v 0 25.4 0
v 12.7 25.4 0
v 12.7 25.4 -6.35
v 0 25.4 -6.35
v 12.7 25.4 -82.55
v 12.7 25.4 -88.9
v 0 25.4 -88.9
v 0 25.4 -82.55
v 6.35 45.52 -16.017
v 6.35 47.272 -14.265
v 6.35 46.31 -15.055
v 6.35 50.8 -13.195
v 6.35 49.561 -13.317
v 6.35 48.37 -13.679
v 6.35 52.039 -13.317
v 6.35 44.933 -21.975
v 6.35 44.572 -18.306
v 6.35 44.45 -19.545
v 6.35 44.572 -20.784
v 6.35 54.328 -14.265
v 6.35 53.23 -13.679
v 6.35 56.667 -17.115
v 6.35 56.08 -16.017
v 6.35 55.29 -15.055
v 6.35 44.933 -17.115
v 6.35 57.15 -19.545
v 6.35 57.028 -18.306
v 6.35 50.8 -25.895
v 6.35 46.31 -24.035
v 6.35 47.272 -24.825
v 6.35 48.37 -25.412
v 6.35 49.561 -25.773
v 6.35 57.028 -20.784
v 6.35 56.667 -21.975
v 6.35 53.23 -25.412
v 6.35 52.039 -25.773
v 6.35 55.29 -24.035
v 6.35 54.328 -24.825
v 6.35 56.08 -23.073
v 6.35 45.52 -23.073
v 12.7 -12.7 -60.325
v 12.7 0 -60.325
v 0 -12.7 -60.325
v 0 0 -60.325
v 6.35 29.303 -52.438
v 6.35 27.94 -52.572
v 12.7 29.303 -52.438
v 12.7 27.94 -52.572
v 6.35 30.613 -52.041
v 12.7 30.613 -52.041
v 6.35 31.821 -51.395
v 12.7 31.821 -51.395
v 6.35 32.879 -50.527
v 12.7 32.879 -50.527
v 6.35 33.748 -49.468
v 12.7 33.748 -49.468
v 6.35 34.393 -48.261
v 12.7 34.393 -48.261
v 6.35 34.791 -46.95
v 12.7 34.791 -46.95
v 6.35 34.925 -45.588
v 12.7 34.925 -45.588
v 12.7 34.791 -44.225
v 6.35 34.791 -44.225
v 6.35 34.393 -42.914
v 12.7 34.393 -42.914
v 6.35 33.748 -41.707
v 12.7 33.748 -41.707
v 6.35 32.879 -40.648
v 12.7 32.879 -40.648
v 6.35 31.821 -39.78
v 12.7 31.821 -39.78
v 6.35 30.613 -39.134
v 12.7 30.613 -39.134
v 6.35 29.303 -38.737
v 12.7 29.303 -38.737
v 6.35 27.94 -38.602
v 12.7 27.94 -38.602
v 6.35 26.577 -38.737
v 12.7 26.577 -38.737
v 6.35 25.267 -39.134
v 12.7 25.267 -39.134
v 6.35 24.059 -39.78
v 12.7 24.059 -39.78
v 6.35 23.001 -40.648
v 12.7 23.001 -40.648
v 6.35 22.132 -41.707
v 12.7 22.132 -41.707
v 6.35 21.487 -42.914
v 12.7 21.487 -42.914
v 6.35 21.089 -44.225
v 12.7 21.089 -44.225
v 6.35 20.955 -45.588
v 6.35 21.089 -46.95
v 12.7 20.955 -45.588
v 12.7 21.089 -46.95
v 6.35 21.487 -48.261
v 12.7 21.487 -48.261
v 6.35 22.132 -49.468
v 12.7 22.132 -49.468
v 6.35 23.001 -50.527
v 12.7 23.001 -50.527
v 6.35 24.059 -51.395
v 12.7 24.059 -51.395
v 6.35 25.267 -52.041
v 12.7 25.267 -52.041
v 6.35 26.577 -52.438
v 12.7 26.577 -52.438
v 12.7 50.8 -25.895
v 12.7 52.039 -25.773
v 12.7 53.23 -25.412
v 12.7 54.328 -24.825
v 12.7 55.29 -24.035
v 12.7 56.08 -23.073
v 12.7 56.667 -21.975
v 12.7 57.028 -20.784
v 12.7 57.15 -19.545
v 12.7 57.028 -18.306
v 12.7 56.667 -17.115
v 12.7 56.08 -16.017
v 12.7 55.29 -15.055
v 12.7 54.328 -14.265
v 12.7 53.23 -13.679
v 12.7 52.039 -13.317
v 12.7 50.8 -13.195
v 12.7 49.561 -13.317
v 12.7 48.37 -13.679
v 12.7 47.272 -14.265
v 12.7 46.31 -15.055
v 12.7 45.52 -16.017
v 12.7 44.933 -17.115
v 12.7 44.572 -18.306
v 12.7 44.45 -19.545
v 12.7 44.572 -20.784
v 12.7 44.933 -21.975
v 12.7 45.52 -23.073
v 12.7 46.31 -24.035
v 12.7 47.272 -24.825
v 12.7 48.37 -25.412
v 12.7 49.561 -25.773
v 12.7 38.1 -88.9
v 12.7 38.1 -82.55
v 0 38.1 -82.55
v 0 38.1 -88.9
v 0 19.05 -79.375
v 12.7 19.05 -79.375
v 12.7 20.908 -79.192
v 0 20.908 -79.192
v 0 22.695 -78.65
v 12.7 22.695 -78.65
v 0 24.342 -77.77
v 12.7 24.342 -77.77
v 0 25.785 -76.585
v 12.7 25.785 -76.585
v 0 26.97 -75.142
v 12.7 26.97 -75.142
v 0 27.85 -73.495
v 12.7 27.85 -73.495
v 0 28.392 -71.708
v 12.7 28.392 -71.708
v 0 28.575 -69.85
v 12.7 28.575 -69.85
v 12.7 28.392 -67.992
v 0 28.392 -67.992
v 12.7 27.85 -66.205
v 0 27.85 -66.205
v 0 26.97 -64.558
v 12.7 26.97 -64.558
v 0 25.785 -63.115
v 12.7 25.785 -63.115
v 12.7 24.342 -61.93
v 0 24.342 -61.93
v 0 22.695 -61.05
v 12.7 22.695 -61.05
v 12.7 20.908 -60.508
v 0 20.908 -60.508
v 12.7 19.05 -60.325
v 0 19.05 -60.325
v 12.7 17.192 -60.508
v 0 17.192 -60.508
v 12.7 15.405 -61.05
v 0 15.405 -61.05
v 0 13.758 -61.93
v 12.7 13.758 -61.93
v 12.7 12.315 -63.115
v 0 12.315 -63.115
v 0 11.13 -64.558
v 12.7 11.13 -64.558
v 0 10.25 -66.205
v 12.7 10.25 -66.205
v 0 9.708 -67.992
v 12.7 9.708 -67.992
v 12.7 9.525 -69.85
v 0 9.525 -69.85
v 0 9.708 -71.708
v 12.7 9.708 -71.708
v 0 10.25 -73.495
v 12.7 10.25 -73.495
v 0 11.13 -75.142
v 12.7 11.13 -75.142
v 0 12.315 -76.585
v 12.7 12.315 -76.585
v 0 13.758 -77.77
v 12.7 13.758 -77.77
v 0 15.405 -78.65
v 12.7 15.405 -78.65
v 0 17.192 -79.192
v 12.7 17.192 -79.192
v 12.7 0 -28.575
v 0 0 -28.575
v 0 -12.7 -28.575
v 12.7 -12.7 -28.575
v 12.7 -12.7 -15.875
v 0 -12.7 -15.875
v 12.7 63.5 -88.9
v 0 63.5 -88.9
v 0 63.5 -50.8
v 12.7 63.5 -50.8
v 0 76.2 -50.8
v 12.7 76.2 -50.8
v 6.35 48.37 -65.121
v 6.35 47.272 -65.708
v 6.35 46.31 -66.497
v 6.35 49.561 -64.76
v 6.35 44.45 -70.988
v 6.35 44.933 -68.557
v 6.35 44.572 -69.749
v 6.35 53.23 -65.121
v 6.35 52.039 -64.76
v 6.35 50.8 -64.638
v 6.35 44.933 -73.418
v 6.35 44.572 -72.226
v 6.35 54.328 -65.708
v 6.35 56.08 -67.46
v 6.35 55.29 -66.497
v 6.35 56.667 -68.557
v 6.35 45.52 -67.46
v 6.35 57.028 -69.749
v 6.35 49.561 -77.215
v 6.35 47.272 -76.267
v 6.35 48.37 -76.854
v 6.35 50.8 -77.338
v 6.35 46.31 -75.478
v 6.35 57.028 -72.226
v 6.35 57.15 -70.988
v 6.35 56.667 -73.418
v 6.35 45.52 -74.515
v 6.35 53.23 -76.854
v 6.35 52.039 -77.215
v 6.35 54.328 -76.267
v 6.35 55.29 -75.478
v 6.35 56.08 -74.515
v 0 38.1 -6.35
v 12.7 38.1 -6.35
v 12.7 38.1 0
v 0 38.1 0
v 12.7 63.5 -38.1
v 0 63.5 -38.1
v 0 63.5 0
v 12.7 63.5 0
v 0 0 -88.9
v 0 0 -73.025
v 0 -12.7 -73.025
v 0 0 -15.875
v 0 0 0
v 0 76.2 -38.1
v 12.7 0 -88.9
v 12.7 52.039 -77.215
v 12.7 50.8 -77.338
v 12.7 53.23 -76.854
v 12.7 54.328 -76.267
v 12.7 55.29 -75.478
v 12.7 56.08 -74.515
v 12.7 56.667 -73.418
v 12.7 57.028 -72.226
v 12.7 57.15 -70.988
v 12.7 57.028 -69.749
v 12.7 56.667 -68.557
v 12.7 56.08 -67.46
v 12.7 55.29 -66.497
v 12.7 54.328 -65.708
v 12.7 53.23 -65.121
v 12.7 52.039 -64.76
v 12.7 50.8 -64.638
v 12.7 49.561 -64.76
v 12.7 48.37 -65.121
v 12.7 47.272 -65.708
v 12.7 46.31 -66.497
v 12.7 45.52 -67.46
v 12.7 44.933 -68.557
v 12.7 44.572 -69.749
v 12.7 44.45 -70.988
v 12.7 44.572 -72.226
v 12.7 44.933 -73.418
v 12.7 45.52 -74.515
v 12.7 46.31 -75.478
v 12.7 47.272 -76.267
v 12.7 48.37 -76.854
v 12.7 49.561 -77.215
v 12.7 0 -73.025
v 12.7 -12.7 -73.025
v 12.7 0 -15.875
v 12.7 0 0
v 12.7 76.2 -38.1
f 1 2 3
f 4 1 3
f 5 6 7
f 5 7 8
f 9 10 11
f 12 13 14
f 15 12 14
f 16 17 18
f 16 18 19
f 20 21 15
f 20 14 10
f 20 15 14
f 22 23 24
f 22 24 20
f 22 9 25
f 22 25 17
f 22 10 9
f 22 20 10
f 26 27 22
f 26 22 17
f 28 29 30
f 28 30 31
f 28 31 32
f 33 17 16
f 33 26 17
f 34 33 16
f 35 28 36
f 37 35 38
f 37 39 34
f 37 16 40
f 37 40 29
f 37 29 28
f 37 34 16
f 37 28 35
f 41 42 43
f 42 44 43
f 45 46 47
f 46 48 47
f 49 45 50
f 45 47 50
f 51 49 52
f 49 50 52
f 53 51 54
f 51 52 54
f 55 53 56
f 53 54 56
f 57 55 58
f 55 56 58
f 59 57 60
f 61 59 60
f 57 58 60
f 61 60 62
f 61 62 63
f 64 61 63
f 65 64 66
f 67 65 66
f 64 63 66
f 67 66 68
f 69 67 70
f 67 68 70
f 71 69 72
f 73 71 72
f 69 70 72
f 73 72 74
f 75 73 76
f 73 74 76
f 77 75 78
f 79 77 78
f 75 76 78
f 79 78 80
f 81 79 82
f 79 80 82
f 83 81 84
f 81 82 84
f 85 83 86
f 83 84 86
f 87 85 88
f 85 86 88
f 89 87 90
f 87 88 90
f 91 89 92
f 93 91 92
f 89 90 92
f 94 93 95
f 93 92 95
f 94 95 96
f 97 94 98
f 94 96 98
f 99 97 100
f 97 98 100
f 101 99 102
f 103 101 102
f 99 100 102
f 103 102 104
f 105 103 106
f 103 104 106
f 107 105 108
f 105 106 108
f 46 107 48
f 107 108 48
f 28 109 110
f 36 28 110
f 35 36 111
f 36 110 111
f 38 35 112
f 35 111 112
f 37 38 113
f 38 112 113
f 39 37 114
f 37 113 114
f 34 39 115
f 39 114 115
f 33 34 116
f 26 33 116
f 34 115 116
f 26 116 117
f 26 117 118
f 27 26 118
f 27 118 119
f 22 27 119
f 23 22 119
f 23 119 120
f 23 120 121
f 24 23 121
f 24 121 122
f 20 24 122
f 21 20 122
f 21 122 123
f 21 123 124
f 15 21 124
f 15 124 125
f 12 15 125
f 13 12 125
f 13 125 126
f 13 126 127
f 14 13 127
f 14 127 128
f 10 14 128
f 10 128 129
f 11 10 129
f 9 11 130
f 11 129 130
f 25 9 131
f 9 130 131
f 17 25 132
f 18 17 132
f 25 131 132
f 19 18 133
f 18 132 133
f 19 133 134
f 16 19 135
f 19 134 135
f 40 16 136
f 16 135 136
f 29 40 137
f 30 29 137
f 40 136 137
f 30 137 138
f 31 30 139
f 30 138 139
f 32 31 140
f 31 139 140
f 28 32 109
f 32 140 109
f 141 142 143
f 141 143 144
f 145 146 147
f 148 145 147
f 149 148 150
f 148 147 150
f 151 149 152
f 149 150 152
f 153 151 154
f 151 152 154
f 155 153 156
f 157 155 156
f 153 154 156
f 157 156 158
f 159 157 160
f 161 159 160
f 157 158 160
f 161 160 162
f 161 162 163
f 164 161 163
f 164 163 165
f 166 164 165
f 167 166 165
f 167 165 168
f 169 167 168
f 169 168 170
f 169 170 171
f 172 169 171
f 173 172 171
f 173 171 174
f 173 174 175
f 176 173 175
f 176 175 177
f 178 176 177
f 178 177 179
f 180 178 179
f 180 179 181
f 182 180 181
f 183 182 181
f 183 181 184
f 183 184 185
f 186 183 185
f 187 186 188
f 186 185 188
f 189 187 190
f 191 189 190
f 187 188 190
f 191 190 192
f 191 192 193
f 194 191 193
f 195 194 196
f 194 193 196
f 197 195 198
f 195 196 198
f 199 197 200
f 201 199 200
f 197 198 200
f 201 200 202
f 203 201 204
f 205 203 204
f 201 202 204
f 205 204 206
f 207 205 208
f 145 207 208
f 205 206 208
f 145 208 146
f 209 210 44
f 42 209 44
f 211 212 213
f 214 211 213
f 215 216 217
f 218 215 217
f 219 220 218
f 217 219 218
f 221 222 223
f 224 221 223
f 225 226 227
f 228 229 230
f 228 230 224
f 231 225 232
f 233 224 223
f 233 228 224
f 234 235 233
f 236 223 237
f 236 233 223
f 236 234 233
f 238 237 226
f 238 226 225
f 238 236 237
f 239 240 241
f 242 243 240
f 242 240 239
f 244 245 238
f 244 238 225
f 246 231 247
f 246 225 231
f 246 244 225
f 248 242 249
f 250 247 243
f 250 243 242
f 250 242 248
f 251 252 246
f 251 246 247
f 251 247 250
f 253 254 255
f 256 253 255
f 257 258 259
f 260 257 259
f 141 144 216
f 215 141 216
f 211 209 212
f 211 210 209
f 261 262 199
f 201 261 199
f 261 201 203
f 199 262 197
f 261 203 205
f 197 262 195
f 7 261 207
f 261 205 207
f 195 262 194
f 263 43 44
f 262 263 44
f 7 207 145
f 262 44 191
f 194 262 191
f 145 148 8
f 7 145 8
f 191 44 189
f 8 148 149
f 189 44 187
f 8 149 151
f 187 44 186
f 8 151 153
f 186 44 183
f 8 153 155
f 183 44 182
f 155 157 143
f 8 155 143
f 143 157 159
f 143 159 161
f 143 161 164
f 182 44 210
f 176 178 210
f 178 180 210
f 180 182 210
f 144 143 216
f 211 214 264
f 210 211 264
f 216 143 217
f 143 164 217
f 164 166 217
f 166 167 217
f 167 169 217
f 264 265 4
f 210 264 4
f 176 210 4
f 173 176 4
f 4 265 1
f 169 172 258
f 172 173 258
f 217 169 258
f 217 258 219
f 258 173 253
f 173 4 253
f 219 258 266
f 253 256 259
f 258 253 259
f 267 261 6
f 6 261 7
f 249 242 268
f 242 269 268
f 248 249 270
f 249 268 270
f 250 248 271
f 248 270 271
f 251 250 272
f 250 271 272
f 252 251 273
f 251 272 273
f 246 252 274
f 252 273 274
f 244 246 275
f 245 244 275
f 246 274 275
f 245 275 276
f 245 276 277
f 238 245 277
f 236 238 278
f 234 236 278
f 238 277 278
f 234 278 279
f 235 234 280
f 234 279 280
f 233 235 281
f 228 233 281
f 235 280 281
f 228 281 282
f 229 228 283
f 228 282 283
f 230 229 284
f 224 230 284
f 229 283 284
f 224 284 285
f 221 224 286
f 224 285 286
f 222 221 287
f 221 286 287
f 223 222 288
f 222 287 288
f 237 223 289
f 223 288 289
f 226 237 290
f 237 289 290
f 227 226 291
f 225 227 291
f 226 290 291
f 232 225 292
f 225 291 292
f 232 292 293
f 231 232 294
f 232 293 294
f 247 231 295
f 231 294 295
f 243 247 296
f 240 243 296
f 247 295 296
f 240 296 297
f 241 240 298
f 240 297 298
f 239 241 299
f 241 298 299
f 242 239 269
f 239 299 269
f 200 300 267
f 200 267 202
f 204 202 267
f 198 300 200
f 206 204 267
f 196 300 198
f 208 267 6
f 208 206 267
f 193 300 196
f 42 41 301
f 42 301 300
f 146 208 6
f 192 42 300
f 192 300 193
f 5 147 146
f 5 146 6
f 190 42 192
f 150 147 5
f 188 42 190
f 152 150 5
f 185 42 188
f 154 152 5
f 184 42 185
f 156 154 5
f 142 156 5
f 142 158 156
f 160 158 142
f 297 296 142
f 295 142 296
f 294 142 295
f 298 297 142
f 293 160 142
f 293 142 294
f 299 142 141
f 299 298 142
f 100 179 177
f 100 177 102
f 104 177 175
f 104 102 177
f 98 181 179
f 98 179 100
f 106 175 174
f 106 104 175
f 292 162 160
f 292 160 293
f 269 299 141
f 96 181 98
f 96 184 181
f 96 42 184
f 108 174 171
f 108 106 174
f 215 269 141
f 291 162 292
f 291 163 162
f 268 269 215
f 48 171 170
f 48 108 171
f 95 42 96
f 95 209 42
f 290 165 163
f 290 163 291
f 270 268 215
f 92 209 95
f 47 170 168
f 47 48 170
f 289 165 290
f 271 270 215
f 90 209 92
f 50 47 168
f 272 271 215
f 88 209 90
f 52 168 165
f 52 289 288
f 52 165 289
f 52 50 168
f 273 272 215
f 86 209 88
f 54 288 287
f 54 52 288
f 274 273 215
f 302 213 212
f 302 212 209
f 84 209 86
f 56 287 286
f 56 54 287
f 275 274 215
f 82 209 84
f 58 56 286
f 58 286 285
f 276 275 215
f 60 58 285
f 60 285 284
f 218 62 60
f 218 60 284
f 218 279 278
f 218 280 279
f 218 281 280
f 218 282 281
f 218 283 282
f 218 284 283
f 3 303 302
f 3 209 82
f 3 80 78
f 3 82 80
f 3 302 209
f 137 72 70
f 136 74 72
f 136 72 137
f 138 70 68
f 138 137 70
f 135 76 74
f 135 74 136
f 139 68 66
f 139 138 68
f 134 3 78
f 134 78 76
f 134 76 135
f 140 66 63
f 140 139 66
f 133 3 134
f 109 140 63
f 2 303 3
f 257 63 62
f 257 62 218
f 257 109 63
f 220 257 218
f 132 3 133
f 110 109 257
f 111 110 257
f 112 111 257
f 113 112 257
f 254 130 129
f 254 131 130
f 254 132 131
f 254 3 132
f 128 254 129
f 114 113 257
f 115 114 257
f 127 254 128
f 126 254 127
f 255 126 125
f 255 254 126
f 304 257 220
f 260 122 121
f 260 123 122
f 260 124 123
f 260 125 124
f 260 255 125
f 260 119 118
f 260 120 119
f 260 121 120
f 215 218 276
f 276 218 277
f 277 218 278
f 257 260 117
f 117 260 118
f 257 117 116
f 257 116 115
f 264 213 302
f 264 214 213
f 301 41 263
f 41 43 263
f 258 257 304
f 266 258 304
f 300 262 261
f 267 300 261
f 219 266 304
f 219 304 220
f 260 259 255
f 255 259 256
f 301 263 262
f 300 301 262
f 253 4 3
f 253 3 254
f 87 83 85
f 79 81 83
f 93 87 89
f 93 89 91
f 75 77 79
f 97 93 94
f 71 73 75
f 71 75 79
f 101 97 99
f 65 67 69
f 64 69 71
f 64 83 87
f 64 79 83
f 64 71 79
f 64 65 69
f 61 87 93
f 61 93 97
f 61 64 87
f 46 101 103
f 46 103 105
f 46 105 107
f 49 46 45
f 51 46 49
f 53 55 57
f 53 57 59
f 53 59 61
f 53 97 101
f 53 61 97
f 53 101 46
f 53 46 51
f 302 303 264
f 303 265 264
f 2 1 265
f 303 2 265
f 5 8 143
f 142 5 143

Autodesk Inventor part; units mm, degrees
ref_plane "YZ Plane" through (0, 0, 0) normal (1, 0, 0) x (0, 1, 0)
ref_plane "XZ Plane" through (0, 0, 0) normal (0, 1, 0) x (-1, 0, 0)
ref_plane "XY Plane" through (0, 0, 0) normal (0, 0, 1) x (1, 0, 0)
sketch "Sketch1" plane through (0, 0, 0) normal (1, 0, 0) x (0, 1, 0)
  circle A0 centre (27.94, -44.6106) radius 6.985 construction
  circle A1 centre (50.8, -18.5683) radius 6.35 construction
  line L0 (63.5, 0) -> (50.8, 0) construction
  line L1 (50.8, 0) -> (50.8, -12.7) construction
  line L2 (50.8, -12.7) -> (63.5, -12.7) construction
  line L3 (63.5, -12.7) -> (63.5, 0) construction
  circle A2 centre (50.8, -70.0106) radius 6.35 construction
  line L4 (27.94, -31.779) -> (39.0525, -38.1948) construction
  line L5 (39.0525, -38.1948) -> (39.0525, -51.0264) construction
  line L6 (39.0525, -51.0264) -> (27.94, -57.4422) construction
  line L7 (27.94, -57.4422) -> (16.8275, -51.0264) construction
  line L8 (16.8275, -51.0264) -> (16.8275, -38.1948) construction
  line L9 (63.5, 0) -> (0, 0)
  line L10 (0, -88.9) -> (63.5, -88.9)
  line L11 (63.5, -88.9) -> (63.5, 0)
  line L12 (0, -44.45) -> (27.94, -44.45) construction
  line L13 (0, -44.45) -> (27.94, -44.45) construction
  line L14 (27.94, -31.779) -> (16.8275, -38.1948) construction
  line L15 (0, -44.45) -> (63.5, -44.45) construction
  line L16 (0, -44.45) -> (0, -60.325) construction
  line L17 (0, -44.45) -> (15.875, -44.45) construction
  line L18 (0, -60.325) -> (-12.7, -60.325)
  line L19 (-12.7, -60.325) -> (-12.7, -73.025)
  line L20 (-12.7, -73.025) -> (0, -73.025)
  line L21 (0, -44.45) -> (0, -28.575) construction
  line L22 (0, -28.575) -> (-12.7, -28.575)
  line L23 (-12.7, -28.575) -> (-12.7, -15.875)
  line L24 (-12.7, -15.875) -> (0, -15.875)
  line L25 (0, 0) -> (0, -15.875)
  line L26 (0, -28.575) -> (0, -60.325)
  line L27 (0, -73.025) -> (0, -88.9)
  point P0 (0, 0)
  point P1 (0, -12.8606)
  dimension "d13" = 88.9
  dimension "d14" = 63.5
  dimension "d15" = 15.875
  dimension "d16" = 90
  dimension "d17" = 12.7
  dimension "d18" = 12.7
extrude "Extrusion2" add sketch "Sketch1" along normal blind 12.7
sketch "Sketch2" plane through (12.7, 0, 0) normal (1, 0, 0) x (0, 0, -1)
  circle A0 centre (45.5875, 27.94) radius 6.985
  circle A1 centre (19.5452, 50.8) radius 6.35
  circle A2 centre (70.9875, 50.8) radius 6.35
  line L0 (32.7559, 27.94) -> (39.1717, 39.0525) construction
  line L1 (39.1717, 39.0525) -> (52.0033, 39.0525) construction
  line L2 (52.0033, 39.0525) -> (58.4191, 27.94) construction
  line L3 (58.4191, 27.94) -> (52.0033, 16.8275) construction
  line L4 (52.0033, 16.8275) -> (39.1717, 16.8275) construction
  line L5 (45.4269, 0) -> (45.4269, 27.94) construction
  line L6 (32.7559, 27.94) -> (39.1717, 16.8275) construction
  line L7 (88.9, 0) -> (88.9, 63.5) construction
  line L8 (0, 0) -> (88.9, 0) construction
  line L9 (28.575, 0) -> (60.325, 0) construction
  line L10 (44.45, 0) -> (44.45, 63.5) construction
  line L11 (88.9, 63.5) -> (0, 63.5) construction
  line L12 (44.45, 0) -> (44.45, 27.94) construction
  line L13 (44.45, 0) -> (72.39, 0) construction
  dimension "d25" = 27.94
  dimension "d26" = 90
extrude "Extrusion3" cut sketch "Sketch2" against normal blind 6.35
sketch "Sketch3" plane through (12.7, 0, 0) normal (1, 0, 0) x (0, 0, -1)
  line L0 (0, 25.4) -> (6.35, 25.4)
  line L1 (6.35, 25.4) -> (6.35, 38.1)
  line L2 (6.35, 38.1) -> (0, 38.1)
  line L3 (0, 63.5) -> (0, 0) projected
  line L4 (0, 38.1) -> (0, 25.4)
  line L5 (88.9, 63.5) -> (0, 63.5) construction
  line L6 (44.45, 63.5) -> (44.45, 0) construction
  line L7 (28.575, 0) -> (60.325, 0) construction
  line L8 (88.9, 25.4) -> (82.55, 25.4)
  line L9 (82.55, 25.4) -> (82.55, 38.1)
  line L10 (82.55, 38.1) -> (88.9, 38.1)
  line L11 (88.9, 38.1) -> (88.9, 25.4)
  point P0 (0, 31.75)
  point P1 (88.9, 31.75)
  dimension "d28" = 12.7
extrude "Extrusion4" cut sketch "Sketch3" against normal through all
sketch "Sketch4" plane through (12.7, 0, 0) normal (1, 0, 0) x (0, 0, -1)
  line L0 (28.575, 0) -> (60.325, 0) construction
  line L1 (44.45, 0) -> (44.45, 63.5) construction
  line L2 (88.9, 63.5) -> (0, 63.5) construction
  line L3 (44.45, 63.5) -> (44.45, 69.85) construction
  line L4 (44.45, 63.5) -> (50.8, 63.5) construction
  line L5 (38.1, 76.2) -> (50.8, 76.2)
  line L6 (50.8, 76.2) -> (50.8, 63.5)
  line L7 (50.8, 63.5) -> (38.1, 63.5)
  line L8 (38.1, 63.5) -> (38.1, 76.2)
  line L9 (38.1, 76.2) -> (50.8, 63.5) construction
  line L10 (50.8, 76.2) -> (38.1, 63.5) construction
  point P0 (0, 0)
  dimension "d31" = 6.35
  dimension "d32" = 90
  dimension "d33" = 12.7
  dimension "d34" = 12.7
extrude "Extrusion5" add sketch "Sketch4" against normal blind 12.7
sketch "Sketch5" plane through (12.7, 0, 0) normal (1, 0, 0) x (0, 0, -1)
  line L0 (73.025, 0) -> (88.9, 0) construction
  line L1 (88.9, 0) -> (88.9, 19.05) construction
  line L2 (88.9, 0) -> (107.95, 0) construction
  line L3 (88.9, 19.05) -> (69.85, 19.05) construction
  circle A0 centre (69.85, 19.05) radius 9.525
  point P0 (0, 0)
  dimension "d37" = 19.05
  dimension "d38" = 90
  dimension "d39" = 19.05
  dimension "d40" = 90
  dimension "d41" = 19.05
extrude "Extrusion6" cut sketch "Sketch5" against normal through all
properties part number "Far End Cap" material "PVC-Piping"
